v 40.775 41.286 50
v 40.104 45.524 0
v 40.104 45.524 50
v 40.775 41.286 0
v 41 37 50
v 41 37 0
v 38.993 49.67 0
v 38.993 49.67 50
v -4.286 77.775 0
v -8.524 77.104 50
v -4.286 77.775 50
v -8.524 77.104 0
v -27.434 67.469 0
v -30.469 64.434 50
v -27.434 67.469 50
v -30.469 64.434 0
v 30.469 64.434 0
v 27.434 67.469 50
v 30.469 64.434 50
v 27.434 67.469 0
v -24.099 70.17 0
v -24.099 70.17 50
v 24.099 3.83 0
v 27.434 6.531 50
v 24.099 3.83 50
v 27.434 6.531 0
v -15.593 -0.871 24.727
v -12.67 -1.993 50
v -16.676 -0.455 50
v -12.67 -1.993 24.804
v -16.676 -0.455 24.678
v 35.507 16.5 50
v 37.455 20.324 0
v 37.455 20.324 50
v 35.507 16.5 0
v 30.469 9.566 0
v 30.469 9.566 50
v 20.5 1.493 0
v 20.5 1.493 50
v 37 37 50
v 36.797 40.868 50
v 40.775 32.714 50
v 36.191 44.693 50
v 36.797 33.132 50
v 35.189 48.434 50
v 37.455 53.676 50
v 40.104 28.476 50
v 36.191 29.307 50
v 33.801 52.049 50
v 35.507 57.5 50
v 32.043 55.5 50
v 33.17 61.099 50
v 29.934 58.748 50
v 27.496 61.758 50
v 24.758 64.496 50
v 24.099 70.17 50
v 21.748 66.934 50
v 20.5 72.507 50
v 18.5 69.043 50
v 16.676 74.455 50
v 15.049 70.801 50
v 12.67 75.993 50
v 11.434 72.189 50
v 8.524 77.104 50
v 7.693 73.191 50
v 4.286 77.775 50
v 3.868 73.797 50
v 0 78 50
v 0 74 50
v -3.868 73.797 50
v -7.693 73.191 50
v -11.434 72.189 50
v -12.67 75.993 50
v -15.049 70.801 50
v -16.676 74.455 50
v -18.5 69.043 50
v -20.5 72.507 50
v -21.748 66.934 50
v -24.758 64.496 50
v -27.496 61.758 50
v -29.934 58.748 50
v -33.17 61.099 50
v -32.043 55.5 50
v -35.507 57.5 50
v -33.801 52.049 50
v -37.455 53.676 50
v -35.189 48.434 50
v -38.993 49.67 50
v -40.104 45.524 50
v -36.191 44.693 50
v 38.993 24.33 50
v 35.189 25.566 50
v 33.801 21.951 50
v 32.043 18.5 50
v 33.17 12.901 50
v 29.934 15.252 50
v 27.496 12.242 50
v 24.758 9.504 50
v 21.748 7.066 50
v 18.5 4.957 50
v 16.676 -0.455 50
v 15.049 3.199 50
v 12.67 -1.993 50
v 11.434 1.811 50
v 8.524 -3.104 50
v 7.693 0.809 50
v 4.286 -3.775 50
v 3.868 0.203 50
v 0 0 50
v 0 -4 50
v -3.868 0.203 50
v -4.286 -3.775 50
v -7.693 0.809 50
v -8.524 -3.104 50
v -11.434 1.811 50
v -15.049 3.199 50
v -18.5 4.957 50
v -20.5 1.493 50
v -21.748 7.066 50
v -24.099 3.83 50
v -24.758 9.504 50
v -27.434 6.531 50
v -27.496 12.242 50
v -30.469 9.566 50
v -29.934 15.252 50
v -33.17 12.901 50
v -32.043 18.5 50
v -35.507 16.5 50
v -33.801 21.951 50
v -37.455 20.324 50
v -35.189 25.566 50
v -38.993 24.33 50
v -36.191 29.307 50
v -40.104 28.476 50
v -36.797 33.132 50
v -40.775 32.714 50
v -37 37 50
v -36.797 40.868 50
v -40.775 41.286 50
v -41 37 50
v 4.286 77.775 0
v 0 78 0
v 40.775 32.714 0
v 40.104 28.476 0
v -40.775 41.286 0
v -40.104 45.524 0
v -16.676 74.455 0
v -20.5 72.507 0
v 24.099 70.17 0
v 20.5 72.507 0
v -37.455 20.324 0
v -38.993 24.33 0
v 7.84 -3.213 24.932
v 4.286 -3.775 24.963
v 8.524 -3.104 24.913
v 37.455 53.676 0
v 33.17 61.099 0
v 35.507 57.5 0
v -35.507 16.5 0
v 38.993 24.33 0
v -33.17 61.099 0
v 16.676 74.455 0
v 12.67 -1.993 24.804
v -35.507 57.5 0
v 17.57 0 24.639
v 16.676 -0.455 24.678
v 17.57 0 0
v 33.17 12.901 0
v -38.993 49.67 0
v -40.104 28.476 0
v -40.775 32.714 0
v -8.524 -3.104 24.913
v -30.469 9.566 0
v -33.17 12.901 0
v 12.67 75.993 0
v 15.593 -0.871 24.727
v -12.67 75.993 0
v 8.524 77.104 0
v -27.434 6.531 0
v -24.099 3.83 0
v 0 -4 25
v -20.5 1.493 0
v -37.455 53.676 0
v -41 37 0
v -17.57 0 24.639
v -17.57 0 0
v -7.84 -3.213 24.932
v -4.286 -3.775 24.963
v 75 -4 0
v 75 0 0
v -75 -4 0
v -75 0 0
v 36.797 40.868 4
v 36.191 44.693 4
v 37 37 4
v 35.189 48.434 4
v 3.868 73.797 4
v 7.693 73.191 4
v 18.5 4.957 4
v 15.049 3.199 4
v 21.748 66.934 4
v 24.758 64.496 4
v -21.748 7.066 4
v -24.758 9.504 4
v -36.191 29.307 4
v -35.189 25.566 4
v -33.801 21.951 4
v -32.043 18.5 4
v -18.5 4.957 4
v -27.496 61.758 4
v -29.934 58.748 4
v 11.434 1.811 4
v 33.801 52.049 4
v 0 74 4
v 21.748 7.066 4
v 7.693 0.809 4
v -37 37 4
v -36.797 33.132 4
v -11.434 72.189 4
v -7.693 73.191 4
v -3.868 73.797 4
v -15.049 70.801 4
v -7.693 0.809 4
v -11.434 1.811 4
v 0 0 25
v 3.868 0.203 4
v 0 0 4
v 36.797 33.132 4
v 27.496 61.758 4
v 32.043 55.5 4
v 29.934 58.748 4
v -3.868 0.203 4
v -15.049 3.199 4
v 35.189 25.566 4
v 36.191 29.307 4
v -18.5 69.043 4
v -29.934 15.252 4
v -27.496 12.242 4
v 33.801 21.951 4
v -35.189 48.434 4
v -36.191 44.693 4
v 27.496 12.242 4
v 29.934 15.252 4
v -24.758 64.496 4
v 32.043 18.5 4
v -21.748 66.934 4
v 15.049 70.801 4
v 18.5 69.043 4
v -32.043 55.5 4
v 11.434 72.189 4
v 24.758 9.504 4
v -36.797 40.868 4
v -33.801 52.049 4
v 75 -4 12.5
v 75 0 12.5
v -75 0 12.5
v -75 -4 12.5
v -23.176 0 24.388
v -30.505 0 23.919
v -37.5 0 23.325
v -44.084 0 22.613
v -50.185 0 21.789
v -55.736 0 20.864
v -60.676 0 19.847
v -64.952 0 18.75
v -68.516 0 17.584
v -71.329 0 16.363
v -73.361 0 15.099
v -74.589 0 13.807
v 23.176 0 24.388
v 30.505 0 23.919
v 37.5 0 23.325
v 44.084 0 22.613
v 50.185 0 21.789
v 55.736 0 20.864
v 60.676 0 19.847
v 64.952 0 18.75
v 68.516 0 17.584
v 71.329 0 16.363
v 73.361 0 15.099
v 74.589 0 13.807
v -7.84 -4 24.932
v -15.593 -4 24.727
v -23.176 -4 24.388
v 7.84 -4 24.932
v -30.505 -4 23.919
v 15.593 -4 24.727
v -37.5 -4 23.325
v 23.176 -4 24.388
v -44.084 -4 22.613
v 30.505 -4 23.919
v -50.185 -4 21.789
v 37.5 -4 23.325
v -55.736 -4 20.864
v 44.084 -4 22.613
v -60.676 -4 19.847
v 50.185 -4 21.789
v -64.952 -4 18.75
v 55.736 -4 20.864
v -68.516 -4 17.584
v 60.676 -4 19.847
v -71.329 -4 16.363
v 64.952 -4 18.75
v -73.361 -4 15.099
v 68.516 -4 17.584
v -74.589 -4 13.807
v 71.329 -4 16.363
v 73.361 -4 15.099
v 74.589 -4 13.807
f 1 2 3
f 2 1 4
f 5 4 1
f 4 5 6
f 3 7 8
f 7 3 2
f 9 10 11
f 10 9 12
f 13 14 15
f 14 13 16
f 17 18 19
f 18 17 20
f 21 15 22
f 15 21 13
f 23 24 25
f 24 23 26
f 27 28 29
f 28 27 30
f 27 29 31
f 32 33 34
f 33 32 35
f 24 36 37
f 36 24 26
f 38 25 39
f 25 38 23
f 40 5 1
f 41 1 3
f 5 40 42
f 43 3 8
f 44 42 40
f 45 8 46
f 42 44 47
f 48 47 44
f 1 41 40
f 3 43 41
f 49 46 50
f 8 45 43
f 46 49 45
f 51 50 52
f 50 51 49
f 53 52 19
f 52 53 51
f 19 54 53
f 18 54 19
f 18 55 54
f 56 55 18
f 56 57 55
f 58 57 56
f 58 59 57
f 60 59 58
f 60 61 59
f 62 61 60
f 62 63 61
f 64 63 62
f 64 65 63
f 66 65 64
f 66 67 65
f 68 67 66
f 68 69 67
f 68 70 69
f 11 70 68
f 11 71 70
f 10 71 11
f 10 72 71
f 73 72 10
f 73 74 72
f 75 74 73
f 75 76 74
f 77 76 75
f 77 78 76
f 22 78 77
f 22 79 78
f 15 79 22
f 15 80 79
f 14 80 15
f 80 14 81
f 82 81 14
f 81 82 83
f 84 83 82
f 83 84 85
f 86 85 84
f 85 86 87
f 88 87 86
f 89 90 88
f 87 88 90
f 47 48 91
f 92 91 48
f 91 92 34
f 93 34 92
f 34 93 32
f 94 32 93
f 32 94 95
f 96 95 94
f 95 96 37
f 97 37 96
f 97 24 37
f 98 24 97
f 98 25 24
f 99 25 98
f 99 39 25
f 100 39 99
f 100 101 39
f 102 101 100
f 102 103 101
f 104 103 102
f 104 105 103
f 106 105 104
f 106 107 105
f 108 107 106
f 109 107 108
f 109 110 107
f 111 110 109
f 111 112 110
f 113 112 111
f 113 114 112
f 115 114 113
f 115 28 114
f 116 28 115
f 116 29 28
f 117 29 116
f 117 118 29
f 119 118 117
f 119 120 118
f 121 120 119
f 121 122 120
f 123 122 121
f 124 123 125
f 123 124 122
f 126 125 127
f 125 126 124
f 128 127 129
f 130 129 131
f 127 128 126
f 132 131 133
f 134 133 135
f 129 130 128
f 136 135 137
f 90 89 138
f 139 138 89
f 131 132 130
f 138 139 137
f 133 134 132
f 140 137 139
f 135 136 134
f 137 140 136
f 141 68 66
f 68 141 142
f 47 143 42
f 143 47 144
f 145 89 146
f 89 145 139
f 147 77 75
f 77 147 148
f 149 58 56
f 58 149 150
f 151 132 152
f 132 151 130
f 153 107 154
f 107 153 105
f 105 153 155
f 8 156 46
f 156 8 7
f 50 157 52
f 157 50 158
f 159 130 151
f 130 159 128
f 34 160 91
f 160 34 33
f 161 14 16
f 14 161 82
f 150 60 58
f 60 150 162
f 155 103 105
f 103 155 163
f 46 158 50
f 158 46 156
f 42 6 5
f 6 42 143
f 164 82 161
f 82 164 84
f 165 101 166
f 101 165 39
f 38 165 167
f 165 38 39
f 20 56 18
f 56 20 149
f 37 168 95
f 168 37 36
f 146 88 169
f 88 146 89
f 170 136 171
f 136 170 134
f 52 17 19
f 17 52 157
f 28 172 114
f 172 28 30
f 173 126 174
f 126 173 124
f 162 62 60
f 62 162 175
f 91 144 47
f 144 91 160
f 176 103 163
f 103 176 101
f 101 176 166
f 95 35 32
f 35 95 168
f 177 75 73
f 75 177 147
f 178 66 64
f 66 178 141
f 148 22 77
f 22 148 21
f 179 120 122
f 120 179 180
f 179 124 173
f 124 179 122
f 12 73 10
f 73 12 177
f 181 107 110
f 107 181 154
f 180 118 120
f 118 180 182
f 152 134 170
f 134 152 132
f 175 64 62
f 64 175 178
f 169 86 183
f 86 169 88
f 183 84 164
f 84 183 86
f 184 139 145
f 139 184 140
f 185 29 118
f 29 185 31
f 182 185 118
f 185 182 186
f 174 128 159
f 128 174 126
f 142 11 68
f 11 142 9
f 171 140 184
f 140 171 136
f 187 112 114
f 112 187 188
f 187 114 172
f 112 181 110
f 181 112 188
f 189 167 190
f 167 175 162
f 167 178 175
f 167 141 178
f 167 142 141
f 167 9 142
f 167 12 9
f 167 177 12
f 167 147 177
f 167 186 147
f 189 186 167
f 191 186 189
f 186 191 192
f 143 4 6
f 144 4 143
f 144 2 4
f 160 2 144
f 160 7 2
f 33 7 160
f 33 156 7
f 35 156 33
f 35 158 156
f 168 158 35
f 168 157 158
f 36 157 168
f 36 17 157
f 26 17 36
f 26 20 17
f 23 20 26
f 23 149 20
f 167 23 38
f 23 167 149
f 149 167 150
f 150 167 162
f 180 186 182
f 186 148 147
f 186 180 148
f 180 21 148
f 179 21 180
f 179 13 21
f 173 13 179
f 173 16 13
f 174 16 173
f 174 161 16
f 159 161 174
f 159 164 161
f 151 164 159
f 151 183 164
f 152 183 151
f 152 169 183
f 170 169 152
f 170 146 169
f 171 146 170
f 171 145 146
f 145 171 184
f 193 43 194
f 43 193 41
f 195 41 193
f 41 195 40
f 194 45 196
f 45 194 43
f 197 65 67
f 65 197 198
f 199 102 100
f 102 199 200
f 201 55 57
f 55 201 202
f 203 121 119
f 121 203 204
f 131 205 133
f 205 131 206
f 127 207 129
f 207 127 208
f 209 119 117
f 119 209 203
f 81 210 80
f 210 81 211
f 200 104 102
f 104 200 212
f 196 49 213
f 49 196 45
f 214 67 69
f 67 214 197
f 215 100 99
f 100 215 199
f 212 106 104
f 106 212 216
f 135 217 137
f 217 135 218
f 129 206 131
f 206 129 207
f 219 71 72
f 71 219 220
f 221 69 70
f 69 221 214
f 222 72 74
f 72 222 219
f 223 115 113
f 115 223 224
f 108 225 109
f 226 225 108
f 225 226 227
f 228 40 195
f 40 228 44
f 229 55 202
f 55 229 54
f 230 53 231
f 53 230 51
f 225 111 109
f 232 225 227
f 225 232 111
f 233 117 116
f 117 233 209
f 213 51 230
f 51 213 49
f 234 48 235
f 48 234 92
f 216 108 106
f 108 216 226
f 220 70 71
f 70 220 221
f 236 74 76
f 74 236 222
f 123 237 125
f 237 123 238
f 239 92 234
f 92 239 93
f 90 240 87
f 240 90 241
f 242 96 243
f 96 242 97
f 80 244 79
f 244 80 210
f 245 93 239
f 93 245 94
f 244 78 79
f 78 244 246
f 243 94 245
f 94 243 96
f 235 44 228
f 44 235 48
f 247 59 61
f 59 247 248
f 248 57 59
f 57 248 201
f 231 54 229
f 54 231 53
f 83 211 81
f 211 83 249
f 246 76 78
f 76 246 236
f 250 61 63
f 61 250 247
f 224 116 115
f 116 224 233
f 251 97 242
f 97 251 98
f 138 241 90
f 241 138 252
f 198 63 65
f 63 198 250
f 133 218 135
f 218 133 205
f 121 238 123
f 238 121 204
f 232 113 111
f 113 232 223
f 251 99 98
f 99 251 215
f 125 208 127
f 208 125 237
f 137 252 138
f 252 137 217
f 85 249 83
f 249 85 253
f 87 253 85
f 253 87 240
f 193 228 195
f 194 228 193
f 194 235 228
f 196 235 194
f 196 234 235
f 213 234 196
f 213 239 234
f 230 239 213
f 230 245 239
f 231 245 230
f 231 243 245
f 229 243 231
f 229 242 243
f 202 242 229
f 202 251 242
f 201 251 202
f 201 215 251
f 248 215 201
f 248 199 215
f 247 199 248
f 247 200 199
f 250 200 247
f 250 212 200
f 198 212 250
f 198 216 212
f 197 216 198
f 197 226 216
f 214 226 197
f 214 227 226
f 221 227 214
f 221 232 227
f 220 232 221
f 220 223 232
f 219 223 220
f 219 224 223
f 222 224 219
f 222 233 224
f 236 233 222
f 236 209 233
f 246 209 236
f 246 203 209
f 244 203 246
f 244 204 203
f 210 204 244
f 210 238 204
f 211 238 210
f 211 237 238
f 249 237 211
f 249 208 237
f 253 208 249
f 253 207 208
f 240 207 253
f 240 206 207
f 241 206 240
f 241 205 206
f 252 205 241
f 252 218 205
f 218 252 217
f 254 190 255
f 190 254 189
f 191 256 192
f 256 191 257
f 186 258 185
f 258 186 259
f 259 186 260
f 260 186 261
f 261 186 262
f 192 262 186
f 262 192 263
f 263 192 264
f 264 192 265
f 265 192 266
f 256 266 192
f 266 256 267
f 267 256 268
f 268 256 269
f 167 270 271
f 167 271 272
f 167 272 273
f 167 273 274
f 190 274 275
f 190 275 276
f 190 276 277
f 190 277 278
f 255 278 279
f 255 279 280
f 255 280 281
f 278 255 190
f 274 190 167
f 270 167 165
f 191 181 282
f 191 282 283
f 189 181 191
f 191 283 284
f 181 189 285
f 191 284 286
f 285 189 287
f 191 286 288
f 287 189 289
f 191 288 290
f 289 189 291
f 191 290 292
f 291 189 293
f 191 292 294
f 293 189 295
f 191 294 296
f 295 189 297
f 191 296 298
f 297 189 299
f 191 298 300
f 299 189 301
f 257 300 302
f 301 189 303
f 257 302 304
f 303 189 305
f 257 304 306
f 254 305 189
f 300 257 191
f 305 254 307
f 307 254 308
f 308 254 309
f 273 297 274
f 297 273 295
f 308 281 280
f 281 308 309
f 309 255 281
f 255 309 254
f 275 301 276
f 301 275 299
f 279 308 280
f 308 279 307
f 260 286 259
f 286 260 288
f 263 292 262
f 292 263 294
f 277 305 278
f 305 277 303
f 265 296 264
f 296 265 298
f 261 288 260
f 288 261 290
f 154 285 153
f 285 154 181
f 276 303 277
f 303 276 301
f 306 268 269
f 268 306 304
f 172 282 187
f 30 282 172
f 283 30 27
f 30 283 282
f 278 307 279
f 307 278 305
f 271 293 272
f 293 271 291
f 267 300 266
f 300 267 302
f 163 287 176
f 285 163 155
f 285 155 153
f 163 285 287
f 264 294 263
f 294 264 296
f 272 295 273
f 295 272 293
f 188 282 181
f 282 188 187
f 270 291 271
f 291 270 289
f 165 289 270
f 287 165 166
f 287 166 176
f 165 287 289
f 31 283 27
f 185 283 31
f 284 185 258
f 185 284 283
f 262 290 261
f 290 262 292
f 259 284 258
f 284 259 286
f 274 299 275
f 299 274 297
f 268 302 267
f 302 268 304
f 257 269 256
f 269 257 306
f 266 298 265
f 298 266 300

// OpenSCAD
/********** Bottle Holder for child bed ********/

height = 50;  // Height of the bottle holder
inner_r = 37; // Inner radius of bottle holder, its the radius!!! d = 2 r !!!
material = 4; // material thickness
width = 150;  // Width of the back

$fn = 60;     // Resolution

/********** Processing ************************/

union() {


    difference() {
        
        translate( [ 0.00, inner_r, 0.00 ] ) {
            cylinder( h = height, r = inner_r + material );
        }
        
        translate( [ 0.00, inner_r, material ] ) {
            cylinder( h = height, r = inner_r );
        }
        
    }
    
    
    scale( [ 1, 1, 0.50 ] )
    union() {
    
        translate( [ -(width / 2), -material, 0.00 ] ) {
            cube( [ width, material, height / 2 ]);
        }
        
        translate( [ 0, 0, height / 2 ] ) {
            scale( [width, material, height] ) {
                rotate( [ 90, 0.00, 0.00 ] ) {
                    cylinder( r = 0.5, h = 1 );
                }
            }
        }
        
    }
    
}


